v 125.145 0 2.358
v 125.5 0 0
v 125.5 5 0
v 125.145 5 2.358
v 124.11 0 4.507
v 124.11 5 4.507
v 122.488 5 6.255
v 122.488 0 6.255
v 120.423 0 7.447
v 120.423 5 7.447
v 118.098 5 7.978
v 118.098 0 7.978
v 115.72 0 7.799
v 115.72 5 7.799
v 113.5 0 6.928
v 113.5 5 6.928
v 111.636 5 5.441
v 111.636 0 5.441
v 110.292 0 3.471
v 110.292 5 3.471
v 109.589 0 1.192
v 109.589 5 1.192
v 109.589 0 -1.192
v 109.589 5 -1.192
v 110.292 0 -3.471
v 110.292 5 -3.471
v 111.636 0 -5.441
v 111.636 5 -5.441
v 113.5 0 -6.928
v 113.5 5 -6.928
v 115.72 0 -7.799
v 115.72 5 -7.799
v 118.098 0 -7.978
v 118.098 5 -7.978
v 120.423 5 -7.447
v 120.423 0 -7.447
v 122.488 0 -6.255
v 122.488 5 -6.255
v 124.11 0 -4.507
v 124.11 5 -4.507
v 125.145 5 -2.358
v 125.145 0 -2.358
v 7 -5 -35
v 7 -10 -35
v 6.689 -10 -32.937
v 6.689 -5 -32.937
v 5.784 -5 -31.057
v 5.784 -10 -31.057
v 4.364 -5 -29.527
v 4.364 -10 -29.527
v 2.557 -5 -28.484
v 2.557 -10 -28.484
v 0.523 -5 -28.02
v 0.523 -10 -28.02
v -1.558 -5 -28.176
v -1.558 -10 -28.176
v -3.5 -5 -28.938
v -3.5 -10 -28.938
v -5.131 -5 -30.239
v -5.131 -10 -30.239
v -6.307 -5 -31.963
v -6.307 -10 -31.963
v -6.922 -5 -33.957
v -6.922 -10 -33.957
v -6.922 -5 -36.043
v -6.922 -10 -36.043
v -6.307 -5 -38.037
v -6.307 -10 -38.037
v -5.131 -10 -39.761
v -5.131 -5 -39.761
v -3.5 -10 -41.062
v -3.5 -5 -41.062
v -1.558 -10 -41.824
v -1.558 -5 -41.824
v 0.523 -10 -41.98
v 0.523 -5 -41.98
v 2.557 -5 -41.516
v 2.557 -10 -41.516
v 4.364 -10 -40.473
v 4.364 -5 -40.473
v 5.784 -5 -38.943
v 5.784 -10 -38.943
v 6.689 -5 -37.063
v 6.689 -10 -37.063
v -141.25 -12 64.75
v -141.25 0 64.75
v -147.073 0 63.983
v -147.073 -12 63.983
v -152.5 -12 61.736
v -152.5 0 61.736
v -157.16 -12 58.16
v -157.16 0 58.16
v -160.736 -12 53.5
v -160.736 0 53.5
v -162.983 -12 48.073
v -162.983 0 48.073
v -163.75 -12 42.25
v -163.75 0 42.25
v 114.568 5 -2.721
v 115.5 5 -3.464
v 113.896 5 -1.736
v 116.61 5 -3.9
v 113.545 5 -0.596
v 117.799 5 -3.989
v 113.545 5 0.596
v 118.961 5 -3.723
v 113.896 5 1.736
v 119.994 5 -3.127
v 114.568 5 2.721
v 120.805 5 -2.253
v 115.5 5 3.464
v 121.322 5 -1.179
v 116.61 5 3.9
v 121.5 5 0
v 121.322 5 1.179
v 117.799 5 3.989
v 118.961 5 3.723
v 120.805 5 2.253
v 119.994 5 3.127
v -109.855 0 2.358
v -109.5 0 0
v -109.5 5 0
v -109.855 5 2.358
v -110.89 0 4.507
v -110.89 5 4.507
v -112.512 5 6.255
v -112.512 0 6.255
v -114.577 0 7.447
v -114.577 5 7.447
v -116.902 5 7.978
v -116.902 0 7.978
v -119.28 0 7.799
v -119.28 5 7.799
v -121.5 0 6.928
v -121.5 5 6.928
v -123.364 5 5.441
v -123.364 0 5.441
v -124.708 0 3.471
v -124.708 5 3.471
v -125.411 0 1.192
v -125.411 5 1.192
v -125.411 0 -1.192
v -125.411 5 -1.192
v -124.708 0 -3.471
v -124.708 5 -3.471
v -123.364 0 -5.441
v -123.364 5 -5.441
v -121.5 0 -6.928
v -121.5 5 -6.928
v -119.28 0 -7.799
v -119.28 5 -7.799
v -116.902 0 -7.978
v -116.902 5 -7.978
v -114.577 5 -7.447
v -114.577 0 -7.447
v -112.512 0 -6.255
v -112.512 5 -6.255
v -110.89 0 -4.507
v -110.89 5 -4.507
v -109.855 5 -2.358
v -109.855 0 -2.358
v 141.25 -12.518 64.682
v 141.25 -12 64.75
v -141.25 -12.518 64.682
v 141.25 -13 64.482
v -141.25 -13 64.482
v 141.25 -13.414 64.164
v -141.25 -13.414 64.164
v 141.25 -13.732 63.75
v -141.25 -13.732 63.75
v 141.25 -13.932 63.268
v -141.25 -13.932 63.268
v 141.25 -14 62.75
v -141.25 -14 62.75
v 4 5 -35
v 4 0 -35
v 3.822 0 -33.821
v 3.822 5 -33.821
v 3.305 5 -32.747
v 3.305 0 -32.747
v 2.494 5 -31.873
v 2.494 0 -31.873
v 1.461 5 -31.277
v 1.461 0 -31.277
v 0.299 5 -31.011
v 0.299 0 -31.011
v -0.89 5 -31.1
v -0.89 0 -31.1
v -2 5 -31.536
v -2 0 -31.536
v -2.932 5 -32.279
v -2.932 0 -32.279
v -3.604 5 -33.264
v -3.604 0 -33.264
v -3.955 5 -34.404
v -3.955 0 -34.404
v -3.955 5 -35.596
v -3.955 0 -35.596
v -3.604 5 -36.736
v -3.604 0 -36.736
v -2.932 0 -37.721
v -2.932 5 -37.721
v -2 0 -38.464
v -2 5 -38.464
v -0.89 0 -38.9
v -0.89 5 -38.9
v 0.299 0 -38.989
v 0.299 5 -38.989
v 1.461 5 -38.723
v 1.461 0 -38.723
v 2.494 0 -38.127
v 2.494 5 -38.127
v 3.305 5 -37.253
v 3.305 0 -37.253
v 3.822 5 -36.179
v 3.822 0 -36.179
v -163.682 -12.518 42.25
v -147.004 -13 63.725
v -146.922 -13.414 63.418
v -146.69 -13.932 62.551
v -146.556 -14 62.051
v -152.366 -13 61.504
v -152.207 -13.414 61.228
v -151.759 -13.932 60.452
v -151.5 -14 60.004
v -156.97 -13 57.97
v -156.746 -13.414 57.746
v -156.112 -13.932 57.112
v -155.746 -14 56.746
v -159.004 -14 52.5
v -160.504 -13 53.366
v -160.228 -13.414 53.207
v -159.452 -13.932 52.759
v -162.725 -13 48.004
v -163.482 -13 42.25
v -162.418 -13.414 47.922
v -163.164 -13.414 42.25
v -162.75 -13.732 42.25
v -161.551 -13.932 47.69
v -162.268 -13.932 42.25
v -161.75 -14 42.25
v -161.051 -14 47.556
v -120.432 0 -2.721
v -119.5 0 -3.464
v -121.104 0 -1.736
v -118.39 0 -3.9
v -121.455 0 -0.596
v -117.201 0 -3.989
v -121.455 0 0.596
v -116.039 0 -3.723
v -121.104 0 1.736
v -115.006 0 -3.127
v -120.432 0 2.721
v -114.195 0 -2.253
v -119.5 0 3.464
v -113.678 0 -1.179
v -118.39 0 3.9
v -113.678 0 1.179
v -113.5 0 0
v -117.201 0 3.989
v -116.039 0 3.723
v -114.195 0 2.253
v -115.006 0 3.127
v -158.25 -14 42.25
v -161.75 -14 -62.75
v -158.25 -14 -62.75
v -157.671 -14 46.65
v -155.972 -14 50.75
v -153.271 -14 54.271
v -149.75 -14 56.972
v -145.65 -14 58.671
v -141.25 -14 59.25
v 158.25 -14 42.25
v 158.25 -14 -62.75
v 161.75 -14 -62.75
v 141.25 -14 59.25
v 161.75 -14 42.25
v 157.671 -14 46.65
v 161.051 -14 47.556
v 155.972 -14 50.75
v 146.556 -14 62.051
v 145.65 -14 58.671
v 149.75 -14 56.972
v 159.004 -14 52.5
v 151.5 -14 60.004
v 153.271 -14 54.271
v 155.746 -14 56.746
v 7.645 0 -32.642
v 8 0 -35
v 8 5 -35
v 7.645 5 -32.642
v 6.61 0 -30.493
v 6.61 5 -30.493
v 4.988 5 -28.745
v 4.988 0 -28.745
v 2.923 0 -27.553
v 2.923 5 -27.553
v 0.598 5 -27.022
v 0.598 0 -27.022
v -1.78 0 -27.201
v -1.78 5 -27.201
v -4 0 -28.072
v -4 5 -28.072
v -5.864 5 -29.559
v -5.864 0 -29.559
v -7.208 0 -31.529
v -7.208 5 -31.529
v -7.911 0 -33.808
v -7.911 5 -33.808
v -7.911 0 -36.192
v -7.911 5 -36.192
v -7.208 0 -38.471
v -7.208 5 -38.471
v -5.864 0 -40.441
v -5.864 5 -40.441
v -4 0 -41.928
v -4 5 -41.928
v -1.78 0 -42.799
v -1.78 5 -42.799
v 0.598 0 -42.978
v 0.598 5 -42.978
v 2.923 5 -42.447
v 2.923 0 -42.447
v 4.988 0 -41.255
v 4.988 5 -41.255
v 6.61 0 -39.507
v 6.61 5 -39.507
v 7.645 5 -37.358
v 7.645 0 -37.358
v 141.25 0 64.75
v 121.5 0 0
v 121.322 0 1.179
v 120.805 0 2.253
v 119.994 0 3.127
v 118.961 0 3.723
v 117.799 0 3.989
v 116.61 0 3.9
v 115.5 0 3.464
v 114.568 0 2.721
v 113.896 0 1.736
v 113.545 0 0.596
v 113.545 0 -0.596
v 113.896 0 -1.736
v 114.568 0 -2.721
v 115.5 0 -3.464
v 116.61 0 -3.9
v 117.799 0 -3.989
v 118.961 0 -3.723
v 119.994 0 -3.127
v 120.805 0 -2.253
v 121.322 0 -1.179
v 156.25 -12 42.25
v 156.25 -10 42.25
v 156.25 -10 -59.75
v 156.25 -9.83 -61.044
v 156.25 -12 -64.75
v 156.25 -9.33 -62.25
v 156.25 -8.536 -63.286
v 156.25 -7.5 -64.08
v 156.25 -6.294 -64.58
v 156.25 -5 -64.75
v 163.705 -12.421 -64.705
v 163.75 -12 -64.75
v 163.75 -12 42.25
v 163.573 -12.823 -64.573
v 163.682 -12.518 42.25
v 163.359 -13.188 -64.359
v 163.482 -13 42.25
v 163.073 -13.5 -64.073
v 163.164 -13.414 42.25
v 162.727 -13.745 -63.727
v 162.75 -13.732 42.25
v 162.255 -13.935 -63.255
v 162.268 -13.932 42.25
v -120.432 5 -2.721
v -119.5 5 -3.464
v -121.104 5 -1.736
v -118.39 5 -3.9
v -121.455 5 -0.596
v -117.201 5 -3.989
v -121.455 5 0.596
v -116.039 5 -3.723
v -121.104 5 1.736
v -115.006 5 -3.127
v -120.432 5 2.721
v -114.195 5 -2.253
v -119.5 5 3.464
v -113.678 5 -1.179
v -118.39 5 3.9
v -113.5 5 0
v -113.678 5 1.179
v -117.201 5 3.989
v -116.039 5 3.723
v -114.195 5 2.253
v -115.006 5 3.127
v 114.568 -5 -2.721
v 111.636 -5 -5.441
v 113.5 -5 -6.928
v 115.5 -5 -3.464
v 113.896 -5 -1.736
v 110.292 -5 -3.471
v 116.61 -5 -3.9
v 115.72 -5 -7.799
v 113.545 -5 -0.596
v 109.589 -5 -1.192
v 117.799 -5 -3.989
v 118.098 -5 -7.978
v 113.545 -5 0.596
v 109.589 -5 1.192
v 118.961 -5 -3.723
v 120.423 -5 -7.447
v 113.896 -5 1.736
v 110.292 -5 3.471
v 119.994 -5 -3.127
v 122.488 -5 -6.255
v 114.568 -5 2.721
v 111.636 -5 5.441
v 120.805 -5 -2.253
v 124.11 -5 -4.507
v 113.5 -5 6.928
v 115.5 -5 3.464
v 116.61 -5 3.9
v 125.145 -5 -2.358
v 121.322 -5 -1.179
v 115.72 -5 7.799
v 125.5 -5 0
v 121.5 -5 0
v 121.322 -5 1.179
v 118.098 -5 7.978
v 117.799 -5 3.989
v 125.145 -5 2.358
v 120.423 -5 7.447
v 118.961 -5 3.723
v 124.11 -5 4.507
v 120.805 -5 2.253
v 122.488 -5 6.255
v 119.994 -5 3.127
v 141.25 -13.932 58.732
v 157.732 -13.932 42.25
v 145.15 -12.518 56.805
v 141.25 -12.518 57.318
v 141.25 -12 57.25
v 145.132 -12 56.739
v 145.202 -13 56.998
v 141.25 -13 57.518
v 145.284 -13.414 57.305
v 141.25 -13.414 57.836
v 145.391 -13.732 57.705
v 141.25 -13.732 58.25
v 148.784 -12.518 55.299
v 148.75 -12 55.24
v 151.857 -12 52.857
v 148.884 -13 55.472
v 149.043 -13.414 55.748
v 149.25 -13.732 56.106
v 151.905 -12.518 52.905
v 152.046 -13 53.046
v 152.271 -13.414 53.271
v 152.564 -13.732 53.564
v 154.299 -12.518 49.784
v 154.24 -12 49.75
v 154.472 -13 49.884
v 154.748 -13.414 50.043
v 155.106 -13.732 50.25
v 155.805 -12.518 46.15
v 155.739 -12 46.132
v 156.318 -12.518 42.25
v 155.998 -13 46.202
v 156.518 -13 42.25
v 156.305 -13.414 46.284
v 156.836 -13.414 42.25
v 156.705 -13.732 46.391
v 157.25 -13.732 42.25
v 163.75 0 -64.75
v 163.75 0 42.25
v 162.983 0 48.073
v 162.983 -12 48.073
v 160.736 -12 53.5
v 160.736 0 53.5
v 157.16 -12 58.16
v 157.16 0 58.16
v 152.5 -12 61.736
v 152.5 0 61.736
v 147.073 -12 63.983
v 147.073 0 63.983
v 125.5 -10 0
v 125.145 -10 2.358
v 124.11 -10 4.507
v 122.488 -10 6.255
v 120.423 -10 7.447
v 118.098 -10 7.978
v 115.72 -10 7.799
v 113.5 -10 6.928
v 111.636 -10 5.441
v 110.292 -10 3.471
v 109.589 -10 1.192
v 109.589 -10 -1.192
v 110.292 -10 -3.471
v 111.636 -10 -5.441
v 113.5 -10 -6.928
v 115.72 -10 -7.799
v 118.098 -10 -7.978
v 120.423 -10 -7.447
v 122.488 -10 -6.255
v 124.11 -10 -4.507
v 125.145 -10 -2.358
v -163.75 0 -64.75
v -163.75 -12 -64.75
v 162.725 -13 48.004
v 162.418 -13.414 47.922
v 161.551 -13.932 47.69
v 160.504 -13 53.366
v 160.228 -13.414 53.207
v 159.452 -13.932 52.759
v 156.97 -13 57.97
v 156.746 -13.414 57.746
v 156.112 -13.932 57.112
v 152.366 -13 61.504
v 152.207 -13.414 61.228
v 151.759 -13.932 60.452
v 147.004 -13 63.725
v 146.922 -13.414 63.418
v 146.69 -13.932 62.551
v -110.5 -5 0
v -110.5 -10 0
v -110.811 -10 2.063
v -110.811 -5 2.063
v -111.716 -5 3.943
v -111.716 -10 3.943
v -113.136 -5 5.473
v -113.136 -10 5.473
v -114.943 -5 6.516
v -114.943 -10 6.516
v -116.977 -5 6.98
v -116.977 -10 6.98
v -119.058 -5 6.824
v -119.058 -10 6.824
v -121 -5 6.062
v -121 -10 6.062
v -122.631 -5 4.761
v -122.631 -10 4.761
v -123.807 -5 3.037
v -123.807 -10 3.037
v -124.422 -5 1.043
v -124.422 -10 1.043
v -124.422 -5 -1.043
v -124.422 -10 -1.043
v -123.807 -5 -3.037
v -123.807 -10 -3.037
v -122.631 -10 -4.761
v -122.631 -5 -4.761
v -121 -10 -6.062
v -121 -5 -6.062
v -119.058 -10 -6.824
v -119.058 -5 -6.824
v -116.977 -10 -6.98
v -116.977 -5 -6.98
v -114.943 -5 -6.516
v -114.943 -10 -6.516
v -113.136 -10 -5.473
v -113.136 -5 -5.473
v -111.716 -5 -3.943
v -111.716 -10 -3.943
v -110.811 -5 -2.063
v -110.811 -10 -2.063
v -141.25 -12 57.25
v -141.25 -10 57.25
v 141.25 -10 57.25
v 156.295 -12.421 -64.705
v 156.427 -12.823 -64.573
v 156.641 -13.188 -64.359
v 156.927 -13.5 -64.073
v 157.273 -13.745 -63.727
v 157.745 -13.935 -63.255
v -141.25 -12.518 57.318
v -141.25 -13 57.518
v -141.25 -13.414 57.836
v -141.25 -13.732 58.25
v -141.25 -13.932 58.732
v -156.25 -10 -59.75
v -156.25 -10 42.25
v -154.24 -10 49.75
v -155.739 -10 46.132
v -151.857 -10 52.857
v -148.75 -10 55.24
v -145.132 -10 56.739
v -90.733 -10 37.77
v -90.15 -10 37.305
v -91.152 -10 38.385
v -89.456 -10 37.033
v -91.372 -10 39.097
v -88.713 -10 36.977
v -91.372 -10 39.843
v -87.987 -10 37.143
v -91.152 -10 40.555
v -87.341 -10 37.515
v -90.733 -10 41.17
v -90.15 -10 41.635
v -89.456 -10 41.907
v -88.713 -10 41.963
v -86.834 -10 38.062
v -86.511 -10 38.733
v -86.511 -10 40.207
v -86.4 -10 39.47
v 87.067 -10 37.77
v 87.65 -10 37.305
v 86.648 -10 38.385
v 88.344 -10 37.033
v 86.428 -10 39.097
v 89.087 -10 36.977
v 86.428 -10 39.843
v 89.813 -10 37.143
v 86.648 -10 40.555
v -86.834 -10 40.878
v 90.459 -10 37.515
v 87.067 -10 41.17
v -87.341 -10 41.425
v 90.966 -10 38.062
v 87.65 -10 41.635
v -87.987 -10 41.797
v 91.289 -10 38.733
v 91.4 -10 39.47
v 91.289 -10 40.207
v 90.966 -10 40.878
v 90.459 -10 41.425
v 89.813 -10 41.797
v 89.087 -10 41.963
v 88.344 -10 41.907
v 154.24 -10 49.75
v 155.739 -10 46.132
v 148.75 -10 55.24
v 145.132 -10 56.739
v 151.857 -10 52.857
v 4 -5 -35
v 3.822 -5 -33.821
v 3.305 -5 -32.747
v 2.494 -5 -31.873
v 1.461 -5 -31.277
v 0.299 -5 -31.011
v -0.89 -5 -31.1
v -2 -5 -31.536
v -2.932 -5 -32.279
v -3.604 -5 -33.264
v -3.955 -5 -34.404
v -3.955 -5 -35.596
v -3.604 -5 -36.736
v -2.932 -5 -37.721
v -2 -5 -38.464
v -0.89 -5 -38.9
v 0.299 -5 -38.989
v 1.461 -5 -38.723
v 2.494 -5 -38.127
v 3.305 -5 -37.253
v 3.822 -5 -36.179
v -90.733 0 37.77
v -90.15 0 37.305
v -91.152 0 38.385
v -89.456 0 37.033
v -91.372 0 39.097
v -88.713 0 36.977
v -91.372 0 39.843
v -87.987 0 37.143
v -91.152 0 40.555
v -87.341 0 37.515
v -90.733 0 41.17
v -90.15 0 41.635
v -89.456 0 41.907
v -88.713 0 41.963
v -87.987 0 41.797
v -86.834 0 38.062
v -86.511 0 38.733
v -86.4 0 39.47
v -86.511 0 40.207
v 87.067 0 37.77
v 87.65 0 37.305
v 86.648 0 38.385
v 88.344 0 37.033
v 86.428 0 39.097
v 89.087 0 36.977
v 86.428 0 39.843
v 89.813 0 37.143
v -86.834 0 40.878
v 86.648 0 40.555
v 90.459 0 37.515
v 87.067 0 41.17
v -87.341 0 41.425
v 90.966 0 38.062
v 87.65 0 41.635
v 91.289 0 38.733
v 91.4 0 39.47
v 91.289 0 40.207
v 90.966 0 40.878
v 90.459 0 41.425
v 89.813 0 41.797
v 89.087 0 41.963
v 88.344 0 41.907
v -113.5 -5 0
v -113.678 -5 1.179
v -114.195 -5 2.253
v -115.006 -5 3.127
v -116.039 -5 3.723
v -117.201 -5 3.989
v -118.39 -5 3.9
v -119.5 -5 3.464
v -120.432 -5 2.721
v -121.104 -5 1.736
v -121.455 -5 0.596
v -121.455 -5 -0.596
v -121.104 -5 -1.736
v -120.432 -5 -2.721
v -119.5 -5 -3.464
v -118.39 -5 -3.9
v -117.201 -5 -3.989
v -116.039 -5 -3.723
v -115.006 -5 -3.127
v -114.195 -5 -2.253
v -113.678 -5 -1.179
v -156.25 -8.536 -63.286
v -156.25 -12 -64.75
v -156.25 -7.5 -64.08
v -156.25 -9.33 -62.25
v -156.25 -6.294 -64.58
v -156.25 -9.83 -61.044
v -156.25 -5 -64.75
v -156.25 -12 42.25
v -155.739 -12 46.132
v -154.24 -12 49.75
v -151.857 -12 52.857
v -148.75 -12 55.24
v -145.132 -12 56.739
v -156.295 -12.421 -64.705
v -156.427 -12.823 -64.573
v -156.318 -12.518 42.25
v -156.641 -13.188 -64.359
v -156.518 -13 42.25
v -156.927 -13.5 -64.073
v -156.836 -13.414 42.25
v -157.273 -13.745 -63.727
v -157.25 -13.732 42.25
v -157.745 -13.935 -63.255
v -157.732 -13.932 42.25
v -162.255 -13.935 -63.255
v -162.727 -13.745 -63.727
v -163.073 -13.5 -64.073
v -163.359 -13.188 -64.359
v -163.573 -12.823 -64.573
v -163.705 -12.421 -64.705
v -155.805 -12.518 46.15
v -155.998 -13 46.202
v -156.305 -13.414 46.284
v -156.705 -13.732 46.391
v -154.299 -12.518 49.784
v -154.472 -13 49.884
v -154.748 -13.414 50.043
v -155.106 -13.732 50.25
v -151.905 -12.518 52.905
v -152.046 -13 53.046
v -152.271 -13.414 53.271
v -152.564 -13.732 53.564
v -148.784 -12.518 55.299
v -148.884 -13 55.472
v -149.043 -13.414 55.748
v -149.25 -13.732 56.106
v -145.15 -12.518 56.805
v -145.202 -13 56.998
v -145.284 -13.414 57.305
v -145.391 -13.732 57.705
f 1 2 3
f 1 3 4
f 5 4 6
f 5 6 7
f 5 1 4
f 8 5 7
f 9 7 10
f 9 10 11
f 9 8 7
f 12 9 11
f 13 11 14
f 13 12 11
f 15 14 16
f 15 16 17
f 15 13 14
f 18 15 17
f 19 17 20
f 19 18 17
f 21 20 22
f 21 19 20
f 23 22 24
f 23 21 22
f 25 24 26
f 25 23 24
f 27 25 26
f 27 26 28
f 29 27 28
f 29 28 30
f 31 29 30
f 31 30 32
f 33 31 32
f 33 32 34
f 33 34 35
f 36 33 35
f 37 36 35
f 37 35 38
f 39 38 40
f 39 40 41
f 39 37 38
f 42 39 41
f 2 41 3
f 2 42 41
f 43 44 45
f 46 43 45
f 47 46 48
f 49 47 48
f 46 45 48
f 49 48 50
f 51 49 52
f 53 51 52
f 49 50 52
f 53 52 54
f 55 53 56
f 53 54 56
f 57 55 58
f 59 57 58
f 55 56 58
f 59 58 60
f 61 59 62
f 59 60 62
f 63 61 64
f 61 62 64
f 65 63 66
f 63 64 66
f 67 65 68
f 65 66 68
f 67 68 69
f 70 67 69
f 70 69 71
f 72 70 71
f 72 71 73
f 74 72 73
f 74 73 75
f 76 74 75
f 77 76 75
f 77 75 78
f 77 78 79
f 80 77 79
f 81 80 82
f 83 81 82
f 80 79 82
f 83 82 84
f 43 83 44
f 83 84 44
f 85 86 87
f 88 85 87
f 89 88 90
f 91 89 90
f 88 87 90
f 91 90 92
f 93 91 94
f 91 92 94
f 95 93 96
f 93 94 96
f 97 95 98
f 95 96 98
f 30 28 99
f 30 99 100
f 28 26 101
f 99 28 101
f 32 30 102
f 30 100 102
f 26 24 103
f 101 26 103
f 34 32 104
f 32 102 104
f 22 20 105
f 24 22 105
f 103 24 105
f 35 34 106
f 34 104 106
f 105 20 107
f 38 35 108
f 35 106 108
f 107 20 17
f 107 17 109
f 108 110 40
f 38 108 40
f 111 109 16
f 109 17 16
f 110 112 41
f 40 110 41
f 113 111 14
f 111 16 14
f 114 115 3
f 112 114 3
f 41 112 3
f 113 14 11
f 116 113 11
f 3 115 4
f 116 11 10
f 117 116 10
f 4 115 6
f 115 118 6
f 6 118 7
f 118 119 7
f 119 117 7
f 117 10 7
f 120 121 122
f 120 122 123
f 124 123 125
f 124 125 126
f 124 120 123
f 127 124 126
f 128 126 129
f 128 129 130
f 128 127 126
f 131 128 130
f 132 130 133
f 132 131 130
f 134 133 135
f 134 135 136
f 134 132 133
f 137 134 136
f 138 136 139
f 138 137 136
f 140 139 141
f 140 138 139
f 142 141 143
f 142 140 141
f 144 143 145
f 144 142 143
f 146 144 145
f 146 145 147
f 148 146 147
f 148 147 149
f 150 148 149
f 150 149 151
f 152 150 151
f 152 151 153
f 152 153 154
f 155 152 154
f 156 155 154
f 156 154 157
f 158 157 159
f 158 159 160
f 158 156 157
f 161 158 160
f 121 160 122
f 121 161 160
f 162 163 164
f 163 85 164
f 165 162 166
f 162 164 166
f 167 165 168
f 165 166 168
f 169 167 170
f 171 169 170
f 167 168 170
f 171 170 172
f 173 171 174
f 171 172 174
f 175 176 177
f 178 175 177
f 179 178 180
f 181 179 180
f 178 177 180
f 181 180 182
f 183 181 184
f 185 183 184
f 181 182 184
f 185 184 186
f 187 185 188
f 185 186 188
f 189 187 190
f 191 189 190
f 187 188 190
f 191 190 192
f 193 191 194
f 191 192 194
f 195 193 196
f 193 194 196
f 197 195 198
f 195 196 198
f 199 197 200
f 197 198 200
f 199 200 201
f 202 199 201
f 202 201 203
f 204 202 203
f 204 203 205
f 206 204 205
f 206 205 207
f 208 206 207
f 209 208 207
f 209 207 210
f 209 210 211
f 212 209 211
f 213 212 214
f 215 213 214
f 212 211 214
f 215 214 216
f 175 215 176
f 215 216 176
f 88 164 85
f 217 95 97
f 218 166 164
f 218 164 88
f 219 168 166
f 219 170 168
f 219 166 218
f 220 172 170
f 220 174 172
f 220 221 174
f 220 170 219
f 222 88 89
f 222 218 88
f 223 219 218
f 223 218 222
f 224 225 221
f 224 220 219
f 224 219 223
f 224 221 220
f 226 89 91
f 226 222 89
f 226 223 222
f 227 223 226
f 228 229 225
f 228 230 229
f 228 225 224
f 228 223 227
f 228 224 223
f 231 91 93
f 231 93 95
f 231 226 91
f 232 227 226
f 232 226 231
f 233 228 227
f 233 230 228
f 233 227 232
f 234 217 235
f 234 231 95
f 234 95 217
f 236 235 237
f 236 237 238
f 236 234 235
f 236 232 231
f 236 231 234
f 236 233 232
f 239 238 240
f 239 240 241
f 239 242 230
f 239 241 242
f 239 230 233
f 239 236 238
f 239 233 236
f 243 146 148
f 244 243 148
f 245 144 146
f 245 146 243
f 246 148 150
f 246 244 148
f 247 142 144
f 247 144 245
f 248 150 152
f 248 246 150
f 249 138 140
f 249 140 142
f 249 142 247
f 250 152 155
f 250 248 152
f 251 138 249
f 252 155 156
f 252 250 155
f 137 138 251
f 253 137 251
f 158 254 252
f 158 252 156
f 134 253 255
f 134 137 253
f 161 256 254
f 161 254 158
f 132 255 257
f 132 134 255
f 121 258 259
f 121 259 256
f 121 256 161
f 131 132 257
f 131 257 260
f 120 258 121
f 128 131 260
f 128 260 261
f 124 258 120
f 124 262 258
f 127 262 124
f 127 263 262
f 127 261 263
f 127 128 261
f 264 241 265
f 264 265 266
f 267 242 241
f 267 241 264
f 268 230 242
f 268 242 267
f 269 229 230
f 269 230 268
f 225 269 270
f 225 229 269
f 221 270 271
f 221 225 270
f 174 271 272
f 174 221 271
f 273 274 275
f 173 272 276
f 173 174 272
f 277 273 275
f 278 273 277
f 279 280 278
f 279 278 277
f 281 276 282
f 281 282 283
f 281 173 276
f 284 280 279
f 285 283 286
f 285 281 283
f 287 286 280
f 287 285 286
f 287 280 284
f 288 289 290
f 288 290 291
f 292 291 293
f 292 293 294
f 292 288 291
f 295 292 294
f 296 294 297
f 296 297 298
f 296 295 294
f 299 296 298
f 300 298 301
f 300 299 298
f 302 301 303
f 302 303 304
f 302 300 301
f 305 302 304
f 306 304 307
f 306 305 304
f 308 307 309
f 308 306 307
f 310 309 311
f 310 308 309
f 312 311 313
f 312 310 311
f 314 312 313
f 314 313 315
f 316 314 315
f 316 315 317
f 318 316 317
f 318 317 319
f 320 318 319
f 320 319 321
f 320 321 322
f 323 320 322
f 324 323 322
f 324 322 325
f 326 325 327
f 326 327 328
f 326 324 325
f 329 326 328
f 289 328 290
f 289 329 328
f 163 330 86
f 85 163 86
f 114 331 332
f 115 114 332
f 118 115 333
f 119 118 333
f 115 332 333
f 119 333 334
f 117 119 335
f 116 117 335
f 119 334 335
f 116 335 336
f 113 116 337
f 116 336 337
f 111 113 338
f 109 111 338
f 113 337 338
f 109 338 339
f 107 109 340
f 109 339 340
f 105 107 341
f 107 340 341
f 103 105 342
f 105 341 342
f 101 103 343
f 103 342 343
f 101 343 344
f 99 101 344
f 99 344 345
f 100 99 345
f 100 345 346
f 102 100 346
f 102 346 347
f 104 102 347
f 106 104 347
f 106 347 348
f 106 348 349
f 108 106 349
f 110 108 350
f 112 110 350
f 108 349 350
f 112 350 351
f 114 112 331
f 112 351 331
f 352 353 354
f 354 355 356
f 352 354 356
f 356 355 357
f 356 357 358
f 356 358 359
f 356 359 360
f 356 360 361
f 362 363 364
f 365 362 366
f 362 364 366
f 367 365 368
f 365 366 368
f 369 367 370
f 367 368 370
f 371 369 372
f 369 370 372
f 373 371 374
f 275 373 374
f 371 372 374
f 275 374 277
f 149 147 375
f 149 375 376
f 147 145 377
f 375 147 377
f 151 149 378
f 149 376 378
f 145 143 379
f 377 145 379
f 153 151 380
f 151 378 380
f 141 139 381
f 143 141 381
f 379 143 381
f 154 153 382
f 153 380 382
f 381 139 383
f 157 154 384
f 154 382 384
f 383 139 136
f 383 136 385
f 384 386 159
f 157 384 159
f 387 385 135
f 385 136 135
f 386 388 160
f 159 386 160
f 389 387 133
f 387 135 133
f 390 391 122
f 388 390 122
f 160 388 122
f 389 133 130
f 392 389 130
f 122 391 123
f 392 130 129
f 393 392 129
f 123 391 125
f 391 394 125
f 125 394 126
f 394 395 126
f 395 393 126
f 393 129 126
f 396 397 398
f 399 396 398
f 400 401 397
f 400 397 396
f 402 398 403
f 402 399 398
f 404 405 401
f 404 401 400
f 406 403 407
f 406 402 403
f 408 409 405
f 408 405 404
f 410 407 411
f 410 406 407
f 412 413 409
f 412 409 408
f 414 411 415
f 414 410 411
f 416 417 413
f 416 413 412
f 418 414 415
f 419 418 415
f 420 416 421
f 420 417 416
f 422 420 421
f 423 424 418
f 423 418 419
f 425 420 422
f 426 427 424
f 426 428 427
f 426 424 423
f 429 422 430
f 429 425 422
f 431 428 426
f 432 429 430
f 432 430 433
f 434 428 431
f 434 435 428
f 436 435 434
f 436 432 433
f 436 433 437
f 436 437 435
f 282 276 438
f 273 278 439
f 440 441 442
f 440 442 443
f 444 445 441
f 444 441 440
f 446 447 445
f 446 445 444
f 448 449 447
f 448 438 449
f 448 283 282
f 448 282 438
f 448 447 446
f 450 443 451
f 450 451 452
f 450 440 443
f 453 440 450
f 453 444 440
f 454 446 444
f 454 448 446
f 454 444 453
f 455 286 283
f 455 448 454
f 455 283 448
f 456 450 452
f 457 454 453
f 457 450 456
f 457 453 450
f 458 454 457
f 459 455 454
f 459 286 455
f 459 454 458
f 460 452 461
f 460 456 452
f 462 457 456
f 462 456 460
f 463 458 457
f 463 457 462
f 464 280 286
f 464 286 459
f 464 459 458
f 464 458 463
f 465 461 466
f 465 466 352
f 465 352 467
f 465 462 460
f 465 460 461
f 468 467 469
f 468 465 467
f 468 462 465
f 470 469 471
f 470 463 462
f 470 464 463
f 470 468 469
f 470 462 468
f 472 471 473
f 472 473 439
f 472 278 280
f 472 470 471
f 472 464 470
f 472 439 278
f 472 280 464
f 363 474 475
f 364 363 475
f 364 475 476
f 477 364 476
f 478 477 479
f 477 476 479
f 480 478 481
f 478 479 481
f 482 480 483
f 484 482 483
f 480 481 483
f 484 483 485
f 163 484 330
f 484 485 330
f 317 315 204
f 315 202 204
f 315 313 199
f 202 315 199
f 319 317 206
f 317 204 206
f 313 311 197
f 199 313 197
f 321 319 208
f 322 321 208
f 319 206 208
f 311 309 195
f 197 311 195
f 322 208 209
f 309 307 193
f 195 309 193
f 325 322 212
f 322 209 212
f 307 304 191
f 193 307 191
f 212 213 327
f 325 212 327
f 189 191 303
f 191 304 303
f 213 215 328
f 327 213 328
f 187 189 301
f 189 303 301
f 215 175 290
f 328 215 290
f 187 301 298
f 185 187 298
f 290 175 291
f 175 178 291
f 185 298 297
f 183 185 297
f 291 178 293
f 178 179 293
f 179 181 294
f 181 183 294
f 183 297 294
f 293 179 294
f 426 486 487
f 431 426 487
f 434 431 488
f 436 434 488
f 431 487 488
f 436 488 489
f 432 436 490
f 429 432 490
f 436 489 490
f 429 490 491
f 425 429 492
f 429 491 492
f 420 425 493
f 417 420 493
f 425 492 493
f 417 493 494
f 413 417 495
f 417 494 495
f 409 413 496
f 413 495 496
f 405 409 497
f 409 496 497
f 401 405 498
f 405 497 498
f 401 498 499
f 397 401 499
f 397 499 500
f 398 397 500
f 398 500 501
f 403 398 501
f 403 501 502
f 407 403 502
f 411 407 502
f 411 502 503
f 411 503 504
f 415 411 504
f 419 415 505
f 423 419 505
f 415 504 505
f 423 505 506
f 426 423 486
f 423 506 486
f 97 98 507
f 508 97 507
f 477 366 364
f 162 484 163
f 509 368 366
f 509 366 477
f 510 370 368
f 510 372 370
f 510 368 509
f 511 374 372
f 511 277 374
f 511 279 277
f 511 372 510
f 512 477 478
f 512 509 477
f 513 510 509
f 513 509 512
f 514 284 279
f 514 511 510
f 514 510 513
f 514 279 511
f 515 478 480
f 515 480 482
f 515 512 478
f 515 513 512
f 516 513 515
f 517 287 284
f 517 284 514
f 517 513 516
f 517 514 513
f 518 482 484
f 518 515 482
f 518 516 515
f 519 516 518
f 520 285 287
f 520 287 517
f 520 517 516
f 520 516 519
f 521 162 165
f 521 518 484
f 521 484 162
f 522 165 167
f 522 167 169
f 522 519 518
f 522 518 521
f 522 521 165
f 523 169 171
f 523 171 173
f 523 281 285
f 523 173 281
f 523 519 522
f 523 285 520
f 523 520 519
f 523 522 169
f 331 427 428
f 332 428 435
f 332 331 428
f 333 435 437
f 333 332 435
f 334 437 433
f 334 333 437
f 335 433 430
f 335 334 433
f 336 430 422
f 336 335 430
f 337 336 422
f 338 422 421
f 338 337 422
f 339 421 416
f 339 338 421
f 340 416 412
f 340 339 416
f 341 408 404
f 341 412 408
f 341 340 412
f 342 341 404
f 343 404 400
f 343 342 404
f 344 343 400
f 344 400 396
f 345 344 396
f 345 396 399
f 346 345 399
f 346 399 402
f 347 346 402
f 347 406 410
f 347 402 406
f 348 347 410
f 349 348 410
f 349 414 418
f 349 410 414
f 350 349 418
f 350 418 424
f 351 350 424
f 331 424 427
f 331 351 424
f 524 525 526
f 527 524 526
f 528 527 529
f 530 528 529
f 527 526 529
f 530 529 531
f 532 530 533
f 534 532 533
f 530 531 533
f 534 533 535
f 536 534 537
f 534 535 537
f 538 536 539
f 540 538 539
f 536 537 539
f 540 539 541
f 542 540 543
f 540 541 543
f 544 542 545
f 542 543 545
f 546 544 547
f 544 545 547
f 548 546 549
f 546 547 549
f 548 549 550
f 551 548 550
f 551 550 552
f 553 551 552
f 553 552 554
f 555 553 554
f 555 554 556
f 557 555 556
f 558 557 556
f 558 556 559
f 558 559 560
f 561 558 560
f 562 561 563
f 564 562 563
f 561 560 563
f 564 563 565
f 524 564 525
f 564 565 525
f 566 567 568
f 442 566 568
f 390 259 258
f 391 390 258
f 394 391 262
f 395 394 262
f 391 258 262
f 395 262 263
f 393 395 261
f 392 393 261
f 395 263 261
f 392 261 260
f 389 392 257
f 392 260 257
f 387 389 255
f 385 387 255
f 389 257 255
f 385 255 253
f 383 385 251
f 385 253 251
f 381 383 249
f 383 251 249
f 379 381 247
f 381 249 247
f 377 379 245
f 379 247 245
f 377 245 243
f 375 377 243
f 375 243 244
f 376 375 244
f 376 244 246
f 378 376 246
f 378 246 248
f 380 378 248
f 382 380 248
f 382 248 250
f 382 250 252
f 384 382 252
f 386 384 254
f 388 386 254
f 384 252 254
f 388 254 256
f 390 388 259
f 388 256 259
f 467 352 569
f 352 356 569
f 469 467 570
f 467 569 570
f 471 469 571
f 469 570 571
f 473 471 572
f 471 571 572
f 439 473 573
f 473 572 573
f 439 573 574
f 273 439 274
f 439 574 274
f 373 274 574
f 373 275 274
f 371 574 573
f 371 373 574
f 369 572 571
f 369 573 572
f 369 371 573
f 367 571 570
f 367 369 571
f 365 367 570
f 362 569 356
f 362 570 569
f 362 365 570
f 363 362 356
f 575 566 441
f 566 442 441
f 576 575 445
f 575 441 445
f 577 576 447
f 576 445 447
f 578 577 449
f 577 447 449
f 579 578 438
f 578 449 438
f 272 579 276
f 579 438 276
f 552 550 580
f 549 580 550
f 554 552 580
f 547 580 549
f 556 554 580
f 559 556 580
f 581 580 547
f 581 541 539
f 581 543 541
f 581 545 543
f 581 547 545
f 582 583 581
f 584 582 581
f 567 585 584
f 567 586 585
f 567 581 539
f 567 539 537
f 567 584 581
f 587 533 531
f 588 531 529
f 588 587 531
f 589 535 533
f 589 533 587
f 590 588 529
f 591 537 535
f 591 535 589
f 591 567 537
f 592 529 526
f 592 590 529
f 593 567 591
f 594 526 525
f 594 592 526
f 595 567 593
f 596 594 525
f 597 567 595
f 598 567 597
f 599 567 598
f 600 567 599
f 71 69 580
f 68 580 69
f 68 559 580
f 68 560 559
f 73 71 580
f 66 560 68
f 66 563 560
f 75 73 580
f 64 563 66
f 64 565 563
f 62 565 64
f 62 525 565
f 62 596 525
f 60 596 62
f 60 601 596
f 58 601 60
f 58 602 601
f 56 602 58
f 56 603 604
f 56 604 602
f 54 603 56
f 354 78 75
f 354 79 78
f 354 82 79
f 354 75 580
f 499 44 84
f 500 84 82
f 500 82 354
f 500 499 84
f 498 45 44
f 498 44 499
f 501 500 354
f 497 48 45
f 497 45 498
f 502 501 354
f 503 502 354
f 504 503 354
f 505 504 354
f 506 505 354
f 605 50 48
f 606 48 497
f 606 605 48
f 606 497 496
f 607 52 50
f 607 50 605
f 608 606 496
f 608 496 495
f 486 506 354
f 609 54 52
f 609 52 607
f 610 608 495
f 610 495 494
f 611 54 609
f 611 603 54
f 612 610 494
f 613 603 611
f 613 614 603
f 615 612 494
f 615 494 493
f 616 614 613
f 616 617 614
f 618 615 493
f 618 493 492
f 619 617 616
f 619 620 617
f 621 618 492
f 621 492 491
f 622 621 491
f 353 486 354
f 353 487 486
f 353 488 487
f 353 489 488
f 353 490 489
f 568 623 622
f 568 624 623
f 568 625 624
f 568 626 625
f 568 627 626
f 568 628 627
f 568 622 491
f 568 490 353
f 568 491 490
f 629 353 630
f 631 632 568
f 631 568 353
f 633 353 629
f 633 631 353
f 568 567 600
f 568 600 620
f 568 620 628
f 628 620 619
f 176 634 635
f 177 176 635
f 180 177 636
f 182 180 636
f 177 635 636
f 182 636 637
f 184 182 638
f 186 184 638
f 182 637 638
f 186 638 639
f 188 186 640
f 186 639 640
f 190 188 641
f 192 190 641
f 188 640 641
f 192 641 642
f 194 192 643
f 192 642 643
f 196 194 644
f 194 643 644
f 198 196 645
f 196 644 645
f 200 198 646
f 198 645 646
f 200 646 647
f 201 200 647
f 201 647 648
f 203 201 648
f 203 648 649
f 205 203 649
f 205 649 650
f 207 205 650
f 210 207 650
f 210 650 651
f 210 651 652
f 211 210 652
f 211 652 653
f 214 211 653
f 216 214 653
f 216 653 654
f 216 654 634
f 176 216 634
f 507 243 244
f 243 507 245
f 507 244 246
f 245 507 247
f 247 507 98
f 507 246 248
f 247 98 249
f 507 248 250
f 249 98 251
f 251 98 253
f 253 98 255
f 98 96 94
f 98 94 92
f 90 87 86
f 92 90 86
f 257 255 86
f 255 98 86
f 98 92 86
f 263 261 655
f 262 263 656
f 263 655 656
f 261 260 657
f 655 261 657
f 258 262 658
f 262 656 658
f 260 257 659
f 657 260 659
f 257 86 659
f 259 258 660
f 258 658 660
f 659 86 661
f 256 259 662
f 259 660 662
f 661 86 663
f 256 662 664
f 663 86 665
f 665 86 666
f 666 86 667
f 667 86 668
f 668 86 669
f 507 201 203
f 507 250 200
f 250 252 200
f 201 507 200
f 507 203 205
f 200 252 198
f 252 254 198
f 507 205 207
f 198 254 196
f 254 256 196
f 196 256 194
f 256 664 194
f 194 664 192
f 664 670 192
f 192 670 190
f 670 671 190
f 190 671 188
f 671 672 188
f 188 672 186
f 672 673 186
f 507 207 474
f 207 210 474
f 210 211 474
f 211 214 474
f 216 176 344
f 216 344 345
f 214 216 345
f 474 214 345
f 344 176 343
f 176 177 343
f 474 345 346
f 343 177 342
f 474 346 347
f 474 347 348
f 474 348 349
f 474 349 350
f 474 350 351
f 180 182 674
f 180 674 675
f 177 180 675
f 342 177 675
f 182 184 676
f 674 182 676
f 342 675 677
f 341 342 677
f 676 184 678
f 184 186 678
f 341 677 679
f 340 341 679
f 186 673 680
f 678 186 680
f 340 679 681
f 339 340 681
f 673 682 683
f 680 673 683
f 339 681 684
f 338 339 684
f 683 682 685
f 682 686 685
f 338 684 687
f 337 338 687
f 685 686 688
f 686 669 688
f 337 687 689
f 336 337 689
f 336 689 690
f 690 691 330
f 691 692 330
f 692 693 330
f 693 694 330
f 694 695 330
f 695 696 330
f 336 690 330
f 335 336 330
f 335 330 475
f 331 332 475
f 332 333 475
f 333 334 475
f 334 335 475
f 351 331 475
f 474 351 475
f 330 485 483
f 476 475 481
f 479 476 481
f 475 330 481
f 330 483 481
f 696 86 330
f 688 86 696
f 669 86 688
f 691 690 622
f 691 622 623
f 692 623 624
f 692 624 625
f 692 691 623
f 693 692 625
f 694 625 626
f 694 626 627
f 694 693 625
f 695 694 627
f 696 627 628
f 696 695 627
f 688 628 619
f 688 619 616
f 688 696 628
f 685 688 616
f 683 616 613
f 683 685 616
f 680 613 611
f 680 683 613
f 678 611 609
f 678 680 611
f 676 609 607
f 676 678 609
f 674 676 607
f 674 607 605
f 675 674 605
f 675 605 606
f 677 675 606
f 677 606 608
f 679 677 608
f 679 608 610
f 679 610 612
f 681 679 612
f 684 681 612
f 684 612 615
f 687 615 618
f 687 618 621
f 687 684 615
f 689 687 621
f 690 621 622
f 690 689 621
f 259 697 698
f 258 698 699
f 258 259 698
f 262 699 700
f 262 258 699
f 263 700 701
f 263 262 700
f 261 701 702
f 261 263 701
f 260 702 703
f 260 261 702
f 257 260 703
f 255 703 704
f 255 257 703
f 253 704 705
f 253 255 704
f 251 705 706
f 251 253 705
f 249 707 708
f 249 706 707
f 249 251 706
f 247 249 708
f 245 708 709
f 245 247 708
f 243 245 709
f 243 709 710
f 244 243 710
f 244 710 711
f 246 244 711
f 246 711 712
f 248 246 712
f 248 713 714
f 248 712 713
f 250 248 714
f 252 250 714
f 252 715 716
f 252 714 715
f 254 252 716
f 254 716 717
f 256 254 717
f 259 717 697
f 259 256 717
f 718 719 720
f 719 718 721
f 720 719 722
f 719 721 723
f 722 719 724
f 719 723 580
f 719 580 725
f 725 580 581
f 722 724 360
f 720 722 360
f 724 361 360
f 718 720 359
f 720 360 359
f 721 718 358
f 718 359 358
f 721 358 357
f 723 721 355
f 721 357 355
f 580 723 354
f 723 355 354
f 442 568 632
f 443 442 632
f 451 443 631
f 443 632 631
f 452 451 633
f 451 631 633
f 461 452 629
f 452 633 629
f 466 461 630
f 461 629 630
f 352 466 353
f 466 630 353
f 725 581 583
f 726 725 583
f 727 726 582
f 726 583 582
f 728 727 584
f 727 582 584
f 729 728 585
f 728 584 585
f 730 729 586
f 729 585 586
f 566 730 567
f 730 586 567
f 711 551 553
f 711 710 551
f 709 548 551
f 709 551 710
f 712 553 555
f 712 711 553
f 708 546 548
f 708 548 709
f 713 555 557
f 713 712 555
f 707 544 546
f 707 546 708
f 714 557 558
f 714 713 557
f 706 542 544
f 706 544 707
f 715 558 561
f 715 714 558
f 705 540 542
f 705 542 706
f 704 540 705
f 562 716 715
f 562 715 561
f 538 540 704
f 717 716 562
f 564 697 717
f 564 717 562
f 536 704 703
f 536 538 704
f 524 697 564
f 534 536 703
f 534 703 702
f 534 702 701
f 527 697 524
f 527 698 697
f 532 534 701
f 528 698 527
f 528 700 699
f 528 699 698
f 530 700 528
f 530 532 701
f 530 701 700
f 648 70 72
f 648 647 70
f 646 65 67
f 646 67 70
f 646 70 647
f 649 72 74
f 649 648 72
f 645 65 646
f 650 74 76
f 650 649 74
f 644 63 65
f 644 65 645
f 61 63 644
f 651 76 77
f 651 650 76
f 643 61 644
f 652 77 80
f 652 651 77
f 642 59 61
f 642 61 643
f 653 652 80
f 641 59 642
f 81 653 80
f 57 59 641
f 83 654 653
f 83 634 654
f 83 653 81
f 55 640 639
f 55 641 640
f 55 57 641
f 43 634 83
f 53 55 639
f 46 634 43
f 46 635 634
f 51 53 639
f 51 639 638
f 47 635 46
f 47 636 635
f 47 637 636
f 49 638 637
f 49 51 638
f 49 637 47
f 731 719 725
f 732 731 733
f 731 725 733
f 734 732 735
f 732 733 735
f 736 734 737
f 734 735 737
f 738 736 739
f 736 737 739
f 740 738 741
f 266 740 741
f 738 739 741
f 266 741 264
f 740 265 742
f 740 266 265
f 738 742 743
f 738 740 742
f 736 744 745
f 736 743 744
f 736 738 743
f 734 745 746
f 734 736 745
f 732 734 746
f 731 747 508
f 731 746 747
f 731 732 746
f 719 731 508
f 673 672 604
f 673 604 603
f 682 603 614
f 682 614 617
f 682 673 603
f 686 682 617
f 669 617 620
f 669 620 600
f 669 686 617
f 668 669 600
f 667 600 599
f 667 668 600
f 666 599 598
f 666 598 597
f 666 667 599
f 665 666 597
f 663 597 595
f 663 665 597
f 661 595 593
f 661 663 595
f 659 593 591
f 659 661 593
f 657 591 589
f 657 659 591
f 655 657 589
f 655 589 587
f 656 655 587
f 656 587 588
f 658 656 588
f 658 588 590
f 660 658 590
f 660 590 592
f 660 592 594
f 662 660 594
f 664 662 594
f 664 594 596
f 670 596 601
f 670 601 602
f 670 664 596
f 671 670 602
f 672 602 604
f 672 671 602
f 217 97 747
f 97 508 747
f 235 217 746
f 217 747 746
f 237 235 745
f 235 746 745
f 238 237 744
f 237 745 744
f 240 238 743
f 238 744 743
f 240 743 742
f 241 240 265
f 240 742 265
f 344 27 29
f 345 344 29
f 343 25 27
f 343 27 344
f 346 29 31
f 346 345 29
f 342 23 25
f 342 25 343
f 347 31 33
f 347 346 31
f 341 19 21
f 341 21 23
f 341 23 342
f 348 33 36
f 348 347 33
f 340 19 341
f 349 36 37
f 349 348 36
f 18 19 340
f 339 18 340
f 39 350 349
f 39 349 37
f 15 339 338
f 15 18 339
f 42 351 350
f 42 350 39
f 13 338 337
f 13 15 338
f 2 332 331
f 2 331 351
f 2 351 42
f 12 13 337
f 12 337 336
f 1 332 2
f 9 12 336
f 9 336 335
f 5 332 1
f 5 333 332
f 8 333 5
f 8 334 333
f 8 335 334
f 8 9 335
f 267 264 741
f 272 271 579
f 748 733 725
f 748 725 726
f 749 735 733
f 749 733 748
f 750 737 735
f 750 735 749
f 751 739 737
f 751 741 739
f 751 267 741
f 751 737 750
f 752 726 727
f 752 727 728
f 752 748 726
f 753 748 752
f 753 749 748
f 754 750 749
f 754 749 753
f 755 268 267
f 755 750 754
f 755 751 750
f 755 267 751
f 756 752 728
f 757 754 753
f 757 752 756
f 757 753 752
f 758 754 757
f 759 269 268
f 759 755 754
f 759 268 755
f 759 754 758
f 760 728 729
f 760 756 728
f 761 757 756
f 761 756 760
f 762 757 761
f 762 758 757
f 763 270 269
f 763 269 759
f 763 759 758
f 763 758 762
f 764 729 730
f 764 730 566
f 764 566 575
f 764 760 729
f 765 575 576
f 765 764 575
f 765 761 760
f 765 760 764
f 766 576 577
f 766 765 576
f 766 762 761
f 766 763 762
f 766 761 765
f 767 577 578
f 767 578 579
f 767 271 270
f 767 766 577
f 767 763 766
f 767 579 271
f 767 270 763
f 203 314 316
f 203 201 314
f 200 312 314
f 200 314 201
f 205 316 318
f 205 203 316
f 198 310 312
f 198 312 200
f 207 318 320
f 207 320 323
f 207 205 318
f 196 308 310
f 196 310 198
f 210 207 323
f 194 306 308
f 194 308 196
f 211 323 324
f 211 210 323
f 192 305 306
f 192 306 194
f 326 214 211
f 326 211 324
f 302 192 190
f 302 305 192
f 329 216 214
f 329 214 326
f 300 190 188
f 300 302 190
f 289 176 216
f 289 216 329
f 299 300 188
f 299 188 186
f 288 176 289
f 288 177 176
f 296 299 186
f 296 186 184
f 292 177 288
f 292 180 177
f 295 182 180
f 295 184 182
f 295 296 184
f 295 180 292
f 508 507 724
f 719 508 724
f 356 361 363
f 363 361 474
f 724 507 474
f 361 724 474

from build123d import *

# Parameters (mm, degrees)
F0_R      = 4
F0_R_2    = 2.5
F1_DEPTH  = 10
F2_DEPTH  = 14
F3_R      = 2
F4_R      = 5
F5_R      = 7
F5_R_2    = 8
F6_DEPTH  = 5
F7_R      = 8
F7_R_2    = 4
F8_DEPTH  = 5
F9_R      = 4
F10_DEPTH = 25
F11_R     = 7
F11_R_2   = 4
F12_DEPTH = 5


with BuildPart() as f1:
    # F0 (on Front) → F1 (new body)
    with BuildSketch(Plane.XZ):
        with BuildLine():
            Line((-141.25, 57.25), (141.25, 57.25))
            ThreePointArc((141.25, 57.25), (151.8566017178, 52.8566017178), (156.25, 42.25))
            Line((156.25, 42.25), (156.25, -64.75))
            Line((156.25, -64.75), (163.75, -64.75))
            Line((163.75, -64.75), (163.75, 42.25))
            ThreePointArc((163.75, 42.25), (157.1599025767, 58.1599025767), (141.25, 64.75))
            Line((141.25, 64.75), (-141.25, 64.75))
            ThreePointArc((-141.25, 64.75), (-157.1599025767, 58.1599025767), (-163.75, 42.25))
            Line((-163.75, 42.25), (-163.75, -64.75))
            Line((-163.75, -64.75), (-156.25, -64.75))
            Line((-156.25, -64.75), (-156.25, 42.25))
            ThreePointArc((-156.25, 42.25), (-151.8566017178, 52.8566017178), (-141.25, 57.25))
        make_face()
        with BuildLine():
            ThreePointArc((156.25, 42.25), (151.8566017178, 52.8566017178), (141.25, 57.25))
            Line((141.25, 57.25), (-141.25, 57.25))
            ThreePointArc((-141.25, 57.25), (-151.8566017178, 52.8566017178), (-156.25, 42.25))
            Line((-156.25, 42.25), (-156.25, -64.75))
            Line((-156.25, -64.75), (156.25, -64.75))
            Line((156.25, -64.75), (156.25, 42.25))
        make_face()
        with Locations((-117.5, 0)):
            Circle(F0_R, mode=Mode.SUBTRACT)
        with Locations((-88.9, 39.47)):
            Circle(F0_R_2, mode=Mode.SUBTRACT)
        with Locations((117.5, 0)):
            Circle(F0_R, mode=Mode.SUBTRACT)
        with Locations((88.9, 39.47)):
            Circle(F0_R_2, mode=Mode.SUBTRACT)
    extrude(amount=F1_DEPTH)

    # F0 (on Front) → F2 (join)
    with BuildSketch(Plane.XZ):
        with BuildLine():
            Line((-141.25, 57.25), (141.25, 57.25))
            ThreePointArc((141.25, 57.25), (151.8566017178, 52.8566017178), (156.25, 42.25))
            Line((156.25, 42.25), (156.25, -64.75))
            Line((156.25, -64.75), (163.75, -64.75))
            Line((163.75, -64.75), (163.75, 42.25))
            ThreePointArc((163.75, 42.25), (157.1599025767, 58.1599025767), (141.25, 64.75))
            Line((141.25, 64.75), (-141.25, 64.75))
            ThreePointArc((-141.25, 64.75), (-157.1599025767, 58.1599025767), (-163.75, 42.25))
            Line((-163.75, 42.25), (-163.75, -64.75))
            Line((-163.75, -64.75), (-156.25, -64.75))
            Line((-156.25, -64.75), (-156.25, 42.25))
            ThreePointArc((-156.25, 42.25), (-151.8566017178, 52.8566017178), (-141.25, 57.25))
        make_face()
    extrude(amount=F2_DEPTH)

    # F3
    f3_edges = [f1.edges().sort_by_distance(p)[0] for p in [
        (-163.75, -14, -11.25),
        (0, -14, 57.25),
        (-160, -14, -64.75),
        (160, -14, -64.75),
    ]]
    fillet(f3_edges, radius=F3_R)

    # F4
    f4_edges = [f1.edges().sort_by_distance(p)[0] for p in [
        (0, -10, -64.75),
    ]]
    fillet(f4_edges, radius=F4_R)

    # F5 (on face) → F6 (cut)
    with BuildSketch(Plane.XZ.offset(10)):
        with Locations((-117.5, 0)):
            Circle(F5_R)
        with Locations((117.5, 0)):
            Circle(F5_R_2)
    extrude(amount=-F6_DEPTH, mode=Mode.SUBTRACT)

    # F9 (on face) → F10 (cut)
    with BuildSketch(Plane.XZ.offset(10)):
        with Locations((0, -35)):
            Circle(F9_R)
    extrude(amount=-F10_DEPTH, mode=Mode.SUBTRACT)

    # F11 (on face) → F12 (cut)
    with BuildSketch(Plane.XZ.offset(10)):
        with Locations((0, -35)):
            Circle(F11_R)
        with Locations((0, -35)):
            Circle(F11_R_2, mode=Mode.SUBTRACT)
    extrude(amount=-F12_DEPTH, mode=Mode.SUBTRACT)


with BuildPart() as f8:
    # F7 (on face) → F8 (new body)
    with BuildSketch(Plane.XZ):
        with Locations((117.5, 0)):
            Circle(F7_R)
        with Locations((117.5, 0)):
            Circle(F7_R_2, mode=Mode.SUBTRACT)
    extrude(amount=-F8_DEPTH)


with BuildPart() as f8b:
    # F7 (on face) → F8, piece 2 (new body)
    with BuildSketch(Plane.XZ):
        with Locations((-117.5, 0)):
            Circle(F7_R)
        with Locations((-117.5, 0)):
            Circle(F7_R_2, mode=Mode.SUBTRACT)
    extrude(amount=-F8_DEPTH)


with BuildPart() as f8c:
    # F7 (on face) → F8, piece 3 (new body)
    with BuildSketch(Plane.XZ):
        with Locations((0, -35)):
            Circle(F7_R)
        with Locations((0, -35)):
            Circle(F7_R_2, mode=Mode.SUBTRACT)
    extrude(amount=-F8_DEPTH)


solid = Compound([f1.part, f8.part, f8b.part, f8c.part])
